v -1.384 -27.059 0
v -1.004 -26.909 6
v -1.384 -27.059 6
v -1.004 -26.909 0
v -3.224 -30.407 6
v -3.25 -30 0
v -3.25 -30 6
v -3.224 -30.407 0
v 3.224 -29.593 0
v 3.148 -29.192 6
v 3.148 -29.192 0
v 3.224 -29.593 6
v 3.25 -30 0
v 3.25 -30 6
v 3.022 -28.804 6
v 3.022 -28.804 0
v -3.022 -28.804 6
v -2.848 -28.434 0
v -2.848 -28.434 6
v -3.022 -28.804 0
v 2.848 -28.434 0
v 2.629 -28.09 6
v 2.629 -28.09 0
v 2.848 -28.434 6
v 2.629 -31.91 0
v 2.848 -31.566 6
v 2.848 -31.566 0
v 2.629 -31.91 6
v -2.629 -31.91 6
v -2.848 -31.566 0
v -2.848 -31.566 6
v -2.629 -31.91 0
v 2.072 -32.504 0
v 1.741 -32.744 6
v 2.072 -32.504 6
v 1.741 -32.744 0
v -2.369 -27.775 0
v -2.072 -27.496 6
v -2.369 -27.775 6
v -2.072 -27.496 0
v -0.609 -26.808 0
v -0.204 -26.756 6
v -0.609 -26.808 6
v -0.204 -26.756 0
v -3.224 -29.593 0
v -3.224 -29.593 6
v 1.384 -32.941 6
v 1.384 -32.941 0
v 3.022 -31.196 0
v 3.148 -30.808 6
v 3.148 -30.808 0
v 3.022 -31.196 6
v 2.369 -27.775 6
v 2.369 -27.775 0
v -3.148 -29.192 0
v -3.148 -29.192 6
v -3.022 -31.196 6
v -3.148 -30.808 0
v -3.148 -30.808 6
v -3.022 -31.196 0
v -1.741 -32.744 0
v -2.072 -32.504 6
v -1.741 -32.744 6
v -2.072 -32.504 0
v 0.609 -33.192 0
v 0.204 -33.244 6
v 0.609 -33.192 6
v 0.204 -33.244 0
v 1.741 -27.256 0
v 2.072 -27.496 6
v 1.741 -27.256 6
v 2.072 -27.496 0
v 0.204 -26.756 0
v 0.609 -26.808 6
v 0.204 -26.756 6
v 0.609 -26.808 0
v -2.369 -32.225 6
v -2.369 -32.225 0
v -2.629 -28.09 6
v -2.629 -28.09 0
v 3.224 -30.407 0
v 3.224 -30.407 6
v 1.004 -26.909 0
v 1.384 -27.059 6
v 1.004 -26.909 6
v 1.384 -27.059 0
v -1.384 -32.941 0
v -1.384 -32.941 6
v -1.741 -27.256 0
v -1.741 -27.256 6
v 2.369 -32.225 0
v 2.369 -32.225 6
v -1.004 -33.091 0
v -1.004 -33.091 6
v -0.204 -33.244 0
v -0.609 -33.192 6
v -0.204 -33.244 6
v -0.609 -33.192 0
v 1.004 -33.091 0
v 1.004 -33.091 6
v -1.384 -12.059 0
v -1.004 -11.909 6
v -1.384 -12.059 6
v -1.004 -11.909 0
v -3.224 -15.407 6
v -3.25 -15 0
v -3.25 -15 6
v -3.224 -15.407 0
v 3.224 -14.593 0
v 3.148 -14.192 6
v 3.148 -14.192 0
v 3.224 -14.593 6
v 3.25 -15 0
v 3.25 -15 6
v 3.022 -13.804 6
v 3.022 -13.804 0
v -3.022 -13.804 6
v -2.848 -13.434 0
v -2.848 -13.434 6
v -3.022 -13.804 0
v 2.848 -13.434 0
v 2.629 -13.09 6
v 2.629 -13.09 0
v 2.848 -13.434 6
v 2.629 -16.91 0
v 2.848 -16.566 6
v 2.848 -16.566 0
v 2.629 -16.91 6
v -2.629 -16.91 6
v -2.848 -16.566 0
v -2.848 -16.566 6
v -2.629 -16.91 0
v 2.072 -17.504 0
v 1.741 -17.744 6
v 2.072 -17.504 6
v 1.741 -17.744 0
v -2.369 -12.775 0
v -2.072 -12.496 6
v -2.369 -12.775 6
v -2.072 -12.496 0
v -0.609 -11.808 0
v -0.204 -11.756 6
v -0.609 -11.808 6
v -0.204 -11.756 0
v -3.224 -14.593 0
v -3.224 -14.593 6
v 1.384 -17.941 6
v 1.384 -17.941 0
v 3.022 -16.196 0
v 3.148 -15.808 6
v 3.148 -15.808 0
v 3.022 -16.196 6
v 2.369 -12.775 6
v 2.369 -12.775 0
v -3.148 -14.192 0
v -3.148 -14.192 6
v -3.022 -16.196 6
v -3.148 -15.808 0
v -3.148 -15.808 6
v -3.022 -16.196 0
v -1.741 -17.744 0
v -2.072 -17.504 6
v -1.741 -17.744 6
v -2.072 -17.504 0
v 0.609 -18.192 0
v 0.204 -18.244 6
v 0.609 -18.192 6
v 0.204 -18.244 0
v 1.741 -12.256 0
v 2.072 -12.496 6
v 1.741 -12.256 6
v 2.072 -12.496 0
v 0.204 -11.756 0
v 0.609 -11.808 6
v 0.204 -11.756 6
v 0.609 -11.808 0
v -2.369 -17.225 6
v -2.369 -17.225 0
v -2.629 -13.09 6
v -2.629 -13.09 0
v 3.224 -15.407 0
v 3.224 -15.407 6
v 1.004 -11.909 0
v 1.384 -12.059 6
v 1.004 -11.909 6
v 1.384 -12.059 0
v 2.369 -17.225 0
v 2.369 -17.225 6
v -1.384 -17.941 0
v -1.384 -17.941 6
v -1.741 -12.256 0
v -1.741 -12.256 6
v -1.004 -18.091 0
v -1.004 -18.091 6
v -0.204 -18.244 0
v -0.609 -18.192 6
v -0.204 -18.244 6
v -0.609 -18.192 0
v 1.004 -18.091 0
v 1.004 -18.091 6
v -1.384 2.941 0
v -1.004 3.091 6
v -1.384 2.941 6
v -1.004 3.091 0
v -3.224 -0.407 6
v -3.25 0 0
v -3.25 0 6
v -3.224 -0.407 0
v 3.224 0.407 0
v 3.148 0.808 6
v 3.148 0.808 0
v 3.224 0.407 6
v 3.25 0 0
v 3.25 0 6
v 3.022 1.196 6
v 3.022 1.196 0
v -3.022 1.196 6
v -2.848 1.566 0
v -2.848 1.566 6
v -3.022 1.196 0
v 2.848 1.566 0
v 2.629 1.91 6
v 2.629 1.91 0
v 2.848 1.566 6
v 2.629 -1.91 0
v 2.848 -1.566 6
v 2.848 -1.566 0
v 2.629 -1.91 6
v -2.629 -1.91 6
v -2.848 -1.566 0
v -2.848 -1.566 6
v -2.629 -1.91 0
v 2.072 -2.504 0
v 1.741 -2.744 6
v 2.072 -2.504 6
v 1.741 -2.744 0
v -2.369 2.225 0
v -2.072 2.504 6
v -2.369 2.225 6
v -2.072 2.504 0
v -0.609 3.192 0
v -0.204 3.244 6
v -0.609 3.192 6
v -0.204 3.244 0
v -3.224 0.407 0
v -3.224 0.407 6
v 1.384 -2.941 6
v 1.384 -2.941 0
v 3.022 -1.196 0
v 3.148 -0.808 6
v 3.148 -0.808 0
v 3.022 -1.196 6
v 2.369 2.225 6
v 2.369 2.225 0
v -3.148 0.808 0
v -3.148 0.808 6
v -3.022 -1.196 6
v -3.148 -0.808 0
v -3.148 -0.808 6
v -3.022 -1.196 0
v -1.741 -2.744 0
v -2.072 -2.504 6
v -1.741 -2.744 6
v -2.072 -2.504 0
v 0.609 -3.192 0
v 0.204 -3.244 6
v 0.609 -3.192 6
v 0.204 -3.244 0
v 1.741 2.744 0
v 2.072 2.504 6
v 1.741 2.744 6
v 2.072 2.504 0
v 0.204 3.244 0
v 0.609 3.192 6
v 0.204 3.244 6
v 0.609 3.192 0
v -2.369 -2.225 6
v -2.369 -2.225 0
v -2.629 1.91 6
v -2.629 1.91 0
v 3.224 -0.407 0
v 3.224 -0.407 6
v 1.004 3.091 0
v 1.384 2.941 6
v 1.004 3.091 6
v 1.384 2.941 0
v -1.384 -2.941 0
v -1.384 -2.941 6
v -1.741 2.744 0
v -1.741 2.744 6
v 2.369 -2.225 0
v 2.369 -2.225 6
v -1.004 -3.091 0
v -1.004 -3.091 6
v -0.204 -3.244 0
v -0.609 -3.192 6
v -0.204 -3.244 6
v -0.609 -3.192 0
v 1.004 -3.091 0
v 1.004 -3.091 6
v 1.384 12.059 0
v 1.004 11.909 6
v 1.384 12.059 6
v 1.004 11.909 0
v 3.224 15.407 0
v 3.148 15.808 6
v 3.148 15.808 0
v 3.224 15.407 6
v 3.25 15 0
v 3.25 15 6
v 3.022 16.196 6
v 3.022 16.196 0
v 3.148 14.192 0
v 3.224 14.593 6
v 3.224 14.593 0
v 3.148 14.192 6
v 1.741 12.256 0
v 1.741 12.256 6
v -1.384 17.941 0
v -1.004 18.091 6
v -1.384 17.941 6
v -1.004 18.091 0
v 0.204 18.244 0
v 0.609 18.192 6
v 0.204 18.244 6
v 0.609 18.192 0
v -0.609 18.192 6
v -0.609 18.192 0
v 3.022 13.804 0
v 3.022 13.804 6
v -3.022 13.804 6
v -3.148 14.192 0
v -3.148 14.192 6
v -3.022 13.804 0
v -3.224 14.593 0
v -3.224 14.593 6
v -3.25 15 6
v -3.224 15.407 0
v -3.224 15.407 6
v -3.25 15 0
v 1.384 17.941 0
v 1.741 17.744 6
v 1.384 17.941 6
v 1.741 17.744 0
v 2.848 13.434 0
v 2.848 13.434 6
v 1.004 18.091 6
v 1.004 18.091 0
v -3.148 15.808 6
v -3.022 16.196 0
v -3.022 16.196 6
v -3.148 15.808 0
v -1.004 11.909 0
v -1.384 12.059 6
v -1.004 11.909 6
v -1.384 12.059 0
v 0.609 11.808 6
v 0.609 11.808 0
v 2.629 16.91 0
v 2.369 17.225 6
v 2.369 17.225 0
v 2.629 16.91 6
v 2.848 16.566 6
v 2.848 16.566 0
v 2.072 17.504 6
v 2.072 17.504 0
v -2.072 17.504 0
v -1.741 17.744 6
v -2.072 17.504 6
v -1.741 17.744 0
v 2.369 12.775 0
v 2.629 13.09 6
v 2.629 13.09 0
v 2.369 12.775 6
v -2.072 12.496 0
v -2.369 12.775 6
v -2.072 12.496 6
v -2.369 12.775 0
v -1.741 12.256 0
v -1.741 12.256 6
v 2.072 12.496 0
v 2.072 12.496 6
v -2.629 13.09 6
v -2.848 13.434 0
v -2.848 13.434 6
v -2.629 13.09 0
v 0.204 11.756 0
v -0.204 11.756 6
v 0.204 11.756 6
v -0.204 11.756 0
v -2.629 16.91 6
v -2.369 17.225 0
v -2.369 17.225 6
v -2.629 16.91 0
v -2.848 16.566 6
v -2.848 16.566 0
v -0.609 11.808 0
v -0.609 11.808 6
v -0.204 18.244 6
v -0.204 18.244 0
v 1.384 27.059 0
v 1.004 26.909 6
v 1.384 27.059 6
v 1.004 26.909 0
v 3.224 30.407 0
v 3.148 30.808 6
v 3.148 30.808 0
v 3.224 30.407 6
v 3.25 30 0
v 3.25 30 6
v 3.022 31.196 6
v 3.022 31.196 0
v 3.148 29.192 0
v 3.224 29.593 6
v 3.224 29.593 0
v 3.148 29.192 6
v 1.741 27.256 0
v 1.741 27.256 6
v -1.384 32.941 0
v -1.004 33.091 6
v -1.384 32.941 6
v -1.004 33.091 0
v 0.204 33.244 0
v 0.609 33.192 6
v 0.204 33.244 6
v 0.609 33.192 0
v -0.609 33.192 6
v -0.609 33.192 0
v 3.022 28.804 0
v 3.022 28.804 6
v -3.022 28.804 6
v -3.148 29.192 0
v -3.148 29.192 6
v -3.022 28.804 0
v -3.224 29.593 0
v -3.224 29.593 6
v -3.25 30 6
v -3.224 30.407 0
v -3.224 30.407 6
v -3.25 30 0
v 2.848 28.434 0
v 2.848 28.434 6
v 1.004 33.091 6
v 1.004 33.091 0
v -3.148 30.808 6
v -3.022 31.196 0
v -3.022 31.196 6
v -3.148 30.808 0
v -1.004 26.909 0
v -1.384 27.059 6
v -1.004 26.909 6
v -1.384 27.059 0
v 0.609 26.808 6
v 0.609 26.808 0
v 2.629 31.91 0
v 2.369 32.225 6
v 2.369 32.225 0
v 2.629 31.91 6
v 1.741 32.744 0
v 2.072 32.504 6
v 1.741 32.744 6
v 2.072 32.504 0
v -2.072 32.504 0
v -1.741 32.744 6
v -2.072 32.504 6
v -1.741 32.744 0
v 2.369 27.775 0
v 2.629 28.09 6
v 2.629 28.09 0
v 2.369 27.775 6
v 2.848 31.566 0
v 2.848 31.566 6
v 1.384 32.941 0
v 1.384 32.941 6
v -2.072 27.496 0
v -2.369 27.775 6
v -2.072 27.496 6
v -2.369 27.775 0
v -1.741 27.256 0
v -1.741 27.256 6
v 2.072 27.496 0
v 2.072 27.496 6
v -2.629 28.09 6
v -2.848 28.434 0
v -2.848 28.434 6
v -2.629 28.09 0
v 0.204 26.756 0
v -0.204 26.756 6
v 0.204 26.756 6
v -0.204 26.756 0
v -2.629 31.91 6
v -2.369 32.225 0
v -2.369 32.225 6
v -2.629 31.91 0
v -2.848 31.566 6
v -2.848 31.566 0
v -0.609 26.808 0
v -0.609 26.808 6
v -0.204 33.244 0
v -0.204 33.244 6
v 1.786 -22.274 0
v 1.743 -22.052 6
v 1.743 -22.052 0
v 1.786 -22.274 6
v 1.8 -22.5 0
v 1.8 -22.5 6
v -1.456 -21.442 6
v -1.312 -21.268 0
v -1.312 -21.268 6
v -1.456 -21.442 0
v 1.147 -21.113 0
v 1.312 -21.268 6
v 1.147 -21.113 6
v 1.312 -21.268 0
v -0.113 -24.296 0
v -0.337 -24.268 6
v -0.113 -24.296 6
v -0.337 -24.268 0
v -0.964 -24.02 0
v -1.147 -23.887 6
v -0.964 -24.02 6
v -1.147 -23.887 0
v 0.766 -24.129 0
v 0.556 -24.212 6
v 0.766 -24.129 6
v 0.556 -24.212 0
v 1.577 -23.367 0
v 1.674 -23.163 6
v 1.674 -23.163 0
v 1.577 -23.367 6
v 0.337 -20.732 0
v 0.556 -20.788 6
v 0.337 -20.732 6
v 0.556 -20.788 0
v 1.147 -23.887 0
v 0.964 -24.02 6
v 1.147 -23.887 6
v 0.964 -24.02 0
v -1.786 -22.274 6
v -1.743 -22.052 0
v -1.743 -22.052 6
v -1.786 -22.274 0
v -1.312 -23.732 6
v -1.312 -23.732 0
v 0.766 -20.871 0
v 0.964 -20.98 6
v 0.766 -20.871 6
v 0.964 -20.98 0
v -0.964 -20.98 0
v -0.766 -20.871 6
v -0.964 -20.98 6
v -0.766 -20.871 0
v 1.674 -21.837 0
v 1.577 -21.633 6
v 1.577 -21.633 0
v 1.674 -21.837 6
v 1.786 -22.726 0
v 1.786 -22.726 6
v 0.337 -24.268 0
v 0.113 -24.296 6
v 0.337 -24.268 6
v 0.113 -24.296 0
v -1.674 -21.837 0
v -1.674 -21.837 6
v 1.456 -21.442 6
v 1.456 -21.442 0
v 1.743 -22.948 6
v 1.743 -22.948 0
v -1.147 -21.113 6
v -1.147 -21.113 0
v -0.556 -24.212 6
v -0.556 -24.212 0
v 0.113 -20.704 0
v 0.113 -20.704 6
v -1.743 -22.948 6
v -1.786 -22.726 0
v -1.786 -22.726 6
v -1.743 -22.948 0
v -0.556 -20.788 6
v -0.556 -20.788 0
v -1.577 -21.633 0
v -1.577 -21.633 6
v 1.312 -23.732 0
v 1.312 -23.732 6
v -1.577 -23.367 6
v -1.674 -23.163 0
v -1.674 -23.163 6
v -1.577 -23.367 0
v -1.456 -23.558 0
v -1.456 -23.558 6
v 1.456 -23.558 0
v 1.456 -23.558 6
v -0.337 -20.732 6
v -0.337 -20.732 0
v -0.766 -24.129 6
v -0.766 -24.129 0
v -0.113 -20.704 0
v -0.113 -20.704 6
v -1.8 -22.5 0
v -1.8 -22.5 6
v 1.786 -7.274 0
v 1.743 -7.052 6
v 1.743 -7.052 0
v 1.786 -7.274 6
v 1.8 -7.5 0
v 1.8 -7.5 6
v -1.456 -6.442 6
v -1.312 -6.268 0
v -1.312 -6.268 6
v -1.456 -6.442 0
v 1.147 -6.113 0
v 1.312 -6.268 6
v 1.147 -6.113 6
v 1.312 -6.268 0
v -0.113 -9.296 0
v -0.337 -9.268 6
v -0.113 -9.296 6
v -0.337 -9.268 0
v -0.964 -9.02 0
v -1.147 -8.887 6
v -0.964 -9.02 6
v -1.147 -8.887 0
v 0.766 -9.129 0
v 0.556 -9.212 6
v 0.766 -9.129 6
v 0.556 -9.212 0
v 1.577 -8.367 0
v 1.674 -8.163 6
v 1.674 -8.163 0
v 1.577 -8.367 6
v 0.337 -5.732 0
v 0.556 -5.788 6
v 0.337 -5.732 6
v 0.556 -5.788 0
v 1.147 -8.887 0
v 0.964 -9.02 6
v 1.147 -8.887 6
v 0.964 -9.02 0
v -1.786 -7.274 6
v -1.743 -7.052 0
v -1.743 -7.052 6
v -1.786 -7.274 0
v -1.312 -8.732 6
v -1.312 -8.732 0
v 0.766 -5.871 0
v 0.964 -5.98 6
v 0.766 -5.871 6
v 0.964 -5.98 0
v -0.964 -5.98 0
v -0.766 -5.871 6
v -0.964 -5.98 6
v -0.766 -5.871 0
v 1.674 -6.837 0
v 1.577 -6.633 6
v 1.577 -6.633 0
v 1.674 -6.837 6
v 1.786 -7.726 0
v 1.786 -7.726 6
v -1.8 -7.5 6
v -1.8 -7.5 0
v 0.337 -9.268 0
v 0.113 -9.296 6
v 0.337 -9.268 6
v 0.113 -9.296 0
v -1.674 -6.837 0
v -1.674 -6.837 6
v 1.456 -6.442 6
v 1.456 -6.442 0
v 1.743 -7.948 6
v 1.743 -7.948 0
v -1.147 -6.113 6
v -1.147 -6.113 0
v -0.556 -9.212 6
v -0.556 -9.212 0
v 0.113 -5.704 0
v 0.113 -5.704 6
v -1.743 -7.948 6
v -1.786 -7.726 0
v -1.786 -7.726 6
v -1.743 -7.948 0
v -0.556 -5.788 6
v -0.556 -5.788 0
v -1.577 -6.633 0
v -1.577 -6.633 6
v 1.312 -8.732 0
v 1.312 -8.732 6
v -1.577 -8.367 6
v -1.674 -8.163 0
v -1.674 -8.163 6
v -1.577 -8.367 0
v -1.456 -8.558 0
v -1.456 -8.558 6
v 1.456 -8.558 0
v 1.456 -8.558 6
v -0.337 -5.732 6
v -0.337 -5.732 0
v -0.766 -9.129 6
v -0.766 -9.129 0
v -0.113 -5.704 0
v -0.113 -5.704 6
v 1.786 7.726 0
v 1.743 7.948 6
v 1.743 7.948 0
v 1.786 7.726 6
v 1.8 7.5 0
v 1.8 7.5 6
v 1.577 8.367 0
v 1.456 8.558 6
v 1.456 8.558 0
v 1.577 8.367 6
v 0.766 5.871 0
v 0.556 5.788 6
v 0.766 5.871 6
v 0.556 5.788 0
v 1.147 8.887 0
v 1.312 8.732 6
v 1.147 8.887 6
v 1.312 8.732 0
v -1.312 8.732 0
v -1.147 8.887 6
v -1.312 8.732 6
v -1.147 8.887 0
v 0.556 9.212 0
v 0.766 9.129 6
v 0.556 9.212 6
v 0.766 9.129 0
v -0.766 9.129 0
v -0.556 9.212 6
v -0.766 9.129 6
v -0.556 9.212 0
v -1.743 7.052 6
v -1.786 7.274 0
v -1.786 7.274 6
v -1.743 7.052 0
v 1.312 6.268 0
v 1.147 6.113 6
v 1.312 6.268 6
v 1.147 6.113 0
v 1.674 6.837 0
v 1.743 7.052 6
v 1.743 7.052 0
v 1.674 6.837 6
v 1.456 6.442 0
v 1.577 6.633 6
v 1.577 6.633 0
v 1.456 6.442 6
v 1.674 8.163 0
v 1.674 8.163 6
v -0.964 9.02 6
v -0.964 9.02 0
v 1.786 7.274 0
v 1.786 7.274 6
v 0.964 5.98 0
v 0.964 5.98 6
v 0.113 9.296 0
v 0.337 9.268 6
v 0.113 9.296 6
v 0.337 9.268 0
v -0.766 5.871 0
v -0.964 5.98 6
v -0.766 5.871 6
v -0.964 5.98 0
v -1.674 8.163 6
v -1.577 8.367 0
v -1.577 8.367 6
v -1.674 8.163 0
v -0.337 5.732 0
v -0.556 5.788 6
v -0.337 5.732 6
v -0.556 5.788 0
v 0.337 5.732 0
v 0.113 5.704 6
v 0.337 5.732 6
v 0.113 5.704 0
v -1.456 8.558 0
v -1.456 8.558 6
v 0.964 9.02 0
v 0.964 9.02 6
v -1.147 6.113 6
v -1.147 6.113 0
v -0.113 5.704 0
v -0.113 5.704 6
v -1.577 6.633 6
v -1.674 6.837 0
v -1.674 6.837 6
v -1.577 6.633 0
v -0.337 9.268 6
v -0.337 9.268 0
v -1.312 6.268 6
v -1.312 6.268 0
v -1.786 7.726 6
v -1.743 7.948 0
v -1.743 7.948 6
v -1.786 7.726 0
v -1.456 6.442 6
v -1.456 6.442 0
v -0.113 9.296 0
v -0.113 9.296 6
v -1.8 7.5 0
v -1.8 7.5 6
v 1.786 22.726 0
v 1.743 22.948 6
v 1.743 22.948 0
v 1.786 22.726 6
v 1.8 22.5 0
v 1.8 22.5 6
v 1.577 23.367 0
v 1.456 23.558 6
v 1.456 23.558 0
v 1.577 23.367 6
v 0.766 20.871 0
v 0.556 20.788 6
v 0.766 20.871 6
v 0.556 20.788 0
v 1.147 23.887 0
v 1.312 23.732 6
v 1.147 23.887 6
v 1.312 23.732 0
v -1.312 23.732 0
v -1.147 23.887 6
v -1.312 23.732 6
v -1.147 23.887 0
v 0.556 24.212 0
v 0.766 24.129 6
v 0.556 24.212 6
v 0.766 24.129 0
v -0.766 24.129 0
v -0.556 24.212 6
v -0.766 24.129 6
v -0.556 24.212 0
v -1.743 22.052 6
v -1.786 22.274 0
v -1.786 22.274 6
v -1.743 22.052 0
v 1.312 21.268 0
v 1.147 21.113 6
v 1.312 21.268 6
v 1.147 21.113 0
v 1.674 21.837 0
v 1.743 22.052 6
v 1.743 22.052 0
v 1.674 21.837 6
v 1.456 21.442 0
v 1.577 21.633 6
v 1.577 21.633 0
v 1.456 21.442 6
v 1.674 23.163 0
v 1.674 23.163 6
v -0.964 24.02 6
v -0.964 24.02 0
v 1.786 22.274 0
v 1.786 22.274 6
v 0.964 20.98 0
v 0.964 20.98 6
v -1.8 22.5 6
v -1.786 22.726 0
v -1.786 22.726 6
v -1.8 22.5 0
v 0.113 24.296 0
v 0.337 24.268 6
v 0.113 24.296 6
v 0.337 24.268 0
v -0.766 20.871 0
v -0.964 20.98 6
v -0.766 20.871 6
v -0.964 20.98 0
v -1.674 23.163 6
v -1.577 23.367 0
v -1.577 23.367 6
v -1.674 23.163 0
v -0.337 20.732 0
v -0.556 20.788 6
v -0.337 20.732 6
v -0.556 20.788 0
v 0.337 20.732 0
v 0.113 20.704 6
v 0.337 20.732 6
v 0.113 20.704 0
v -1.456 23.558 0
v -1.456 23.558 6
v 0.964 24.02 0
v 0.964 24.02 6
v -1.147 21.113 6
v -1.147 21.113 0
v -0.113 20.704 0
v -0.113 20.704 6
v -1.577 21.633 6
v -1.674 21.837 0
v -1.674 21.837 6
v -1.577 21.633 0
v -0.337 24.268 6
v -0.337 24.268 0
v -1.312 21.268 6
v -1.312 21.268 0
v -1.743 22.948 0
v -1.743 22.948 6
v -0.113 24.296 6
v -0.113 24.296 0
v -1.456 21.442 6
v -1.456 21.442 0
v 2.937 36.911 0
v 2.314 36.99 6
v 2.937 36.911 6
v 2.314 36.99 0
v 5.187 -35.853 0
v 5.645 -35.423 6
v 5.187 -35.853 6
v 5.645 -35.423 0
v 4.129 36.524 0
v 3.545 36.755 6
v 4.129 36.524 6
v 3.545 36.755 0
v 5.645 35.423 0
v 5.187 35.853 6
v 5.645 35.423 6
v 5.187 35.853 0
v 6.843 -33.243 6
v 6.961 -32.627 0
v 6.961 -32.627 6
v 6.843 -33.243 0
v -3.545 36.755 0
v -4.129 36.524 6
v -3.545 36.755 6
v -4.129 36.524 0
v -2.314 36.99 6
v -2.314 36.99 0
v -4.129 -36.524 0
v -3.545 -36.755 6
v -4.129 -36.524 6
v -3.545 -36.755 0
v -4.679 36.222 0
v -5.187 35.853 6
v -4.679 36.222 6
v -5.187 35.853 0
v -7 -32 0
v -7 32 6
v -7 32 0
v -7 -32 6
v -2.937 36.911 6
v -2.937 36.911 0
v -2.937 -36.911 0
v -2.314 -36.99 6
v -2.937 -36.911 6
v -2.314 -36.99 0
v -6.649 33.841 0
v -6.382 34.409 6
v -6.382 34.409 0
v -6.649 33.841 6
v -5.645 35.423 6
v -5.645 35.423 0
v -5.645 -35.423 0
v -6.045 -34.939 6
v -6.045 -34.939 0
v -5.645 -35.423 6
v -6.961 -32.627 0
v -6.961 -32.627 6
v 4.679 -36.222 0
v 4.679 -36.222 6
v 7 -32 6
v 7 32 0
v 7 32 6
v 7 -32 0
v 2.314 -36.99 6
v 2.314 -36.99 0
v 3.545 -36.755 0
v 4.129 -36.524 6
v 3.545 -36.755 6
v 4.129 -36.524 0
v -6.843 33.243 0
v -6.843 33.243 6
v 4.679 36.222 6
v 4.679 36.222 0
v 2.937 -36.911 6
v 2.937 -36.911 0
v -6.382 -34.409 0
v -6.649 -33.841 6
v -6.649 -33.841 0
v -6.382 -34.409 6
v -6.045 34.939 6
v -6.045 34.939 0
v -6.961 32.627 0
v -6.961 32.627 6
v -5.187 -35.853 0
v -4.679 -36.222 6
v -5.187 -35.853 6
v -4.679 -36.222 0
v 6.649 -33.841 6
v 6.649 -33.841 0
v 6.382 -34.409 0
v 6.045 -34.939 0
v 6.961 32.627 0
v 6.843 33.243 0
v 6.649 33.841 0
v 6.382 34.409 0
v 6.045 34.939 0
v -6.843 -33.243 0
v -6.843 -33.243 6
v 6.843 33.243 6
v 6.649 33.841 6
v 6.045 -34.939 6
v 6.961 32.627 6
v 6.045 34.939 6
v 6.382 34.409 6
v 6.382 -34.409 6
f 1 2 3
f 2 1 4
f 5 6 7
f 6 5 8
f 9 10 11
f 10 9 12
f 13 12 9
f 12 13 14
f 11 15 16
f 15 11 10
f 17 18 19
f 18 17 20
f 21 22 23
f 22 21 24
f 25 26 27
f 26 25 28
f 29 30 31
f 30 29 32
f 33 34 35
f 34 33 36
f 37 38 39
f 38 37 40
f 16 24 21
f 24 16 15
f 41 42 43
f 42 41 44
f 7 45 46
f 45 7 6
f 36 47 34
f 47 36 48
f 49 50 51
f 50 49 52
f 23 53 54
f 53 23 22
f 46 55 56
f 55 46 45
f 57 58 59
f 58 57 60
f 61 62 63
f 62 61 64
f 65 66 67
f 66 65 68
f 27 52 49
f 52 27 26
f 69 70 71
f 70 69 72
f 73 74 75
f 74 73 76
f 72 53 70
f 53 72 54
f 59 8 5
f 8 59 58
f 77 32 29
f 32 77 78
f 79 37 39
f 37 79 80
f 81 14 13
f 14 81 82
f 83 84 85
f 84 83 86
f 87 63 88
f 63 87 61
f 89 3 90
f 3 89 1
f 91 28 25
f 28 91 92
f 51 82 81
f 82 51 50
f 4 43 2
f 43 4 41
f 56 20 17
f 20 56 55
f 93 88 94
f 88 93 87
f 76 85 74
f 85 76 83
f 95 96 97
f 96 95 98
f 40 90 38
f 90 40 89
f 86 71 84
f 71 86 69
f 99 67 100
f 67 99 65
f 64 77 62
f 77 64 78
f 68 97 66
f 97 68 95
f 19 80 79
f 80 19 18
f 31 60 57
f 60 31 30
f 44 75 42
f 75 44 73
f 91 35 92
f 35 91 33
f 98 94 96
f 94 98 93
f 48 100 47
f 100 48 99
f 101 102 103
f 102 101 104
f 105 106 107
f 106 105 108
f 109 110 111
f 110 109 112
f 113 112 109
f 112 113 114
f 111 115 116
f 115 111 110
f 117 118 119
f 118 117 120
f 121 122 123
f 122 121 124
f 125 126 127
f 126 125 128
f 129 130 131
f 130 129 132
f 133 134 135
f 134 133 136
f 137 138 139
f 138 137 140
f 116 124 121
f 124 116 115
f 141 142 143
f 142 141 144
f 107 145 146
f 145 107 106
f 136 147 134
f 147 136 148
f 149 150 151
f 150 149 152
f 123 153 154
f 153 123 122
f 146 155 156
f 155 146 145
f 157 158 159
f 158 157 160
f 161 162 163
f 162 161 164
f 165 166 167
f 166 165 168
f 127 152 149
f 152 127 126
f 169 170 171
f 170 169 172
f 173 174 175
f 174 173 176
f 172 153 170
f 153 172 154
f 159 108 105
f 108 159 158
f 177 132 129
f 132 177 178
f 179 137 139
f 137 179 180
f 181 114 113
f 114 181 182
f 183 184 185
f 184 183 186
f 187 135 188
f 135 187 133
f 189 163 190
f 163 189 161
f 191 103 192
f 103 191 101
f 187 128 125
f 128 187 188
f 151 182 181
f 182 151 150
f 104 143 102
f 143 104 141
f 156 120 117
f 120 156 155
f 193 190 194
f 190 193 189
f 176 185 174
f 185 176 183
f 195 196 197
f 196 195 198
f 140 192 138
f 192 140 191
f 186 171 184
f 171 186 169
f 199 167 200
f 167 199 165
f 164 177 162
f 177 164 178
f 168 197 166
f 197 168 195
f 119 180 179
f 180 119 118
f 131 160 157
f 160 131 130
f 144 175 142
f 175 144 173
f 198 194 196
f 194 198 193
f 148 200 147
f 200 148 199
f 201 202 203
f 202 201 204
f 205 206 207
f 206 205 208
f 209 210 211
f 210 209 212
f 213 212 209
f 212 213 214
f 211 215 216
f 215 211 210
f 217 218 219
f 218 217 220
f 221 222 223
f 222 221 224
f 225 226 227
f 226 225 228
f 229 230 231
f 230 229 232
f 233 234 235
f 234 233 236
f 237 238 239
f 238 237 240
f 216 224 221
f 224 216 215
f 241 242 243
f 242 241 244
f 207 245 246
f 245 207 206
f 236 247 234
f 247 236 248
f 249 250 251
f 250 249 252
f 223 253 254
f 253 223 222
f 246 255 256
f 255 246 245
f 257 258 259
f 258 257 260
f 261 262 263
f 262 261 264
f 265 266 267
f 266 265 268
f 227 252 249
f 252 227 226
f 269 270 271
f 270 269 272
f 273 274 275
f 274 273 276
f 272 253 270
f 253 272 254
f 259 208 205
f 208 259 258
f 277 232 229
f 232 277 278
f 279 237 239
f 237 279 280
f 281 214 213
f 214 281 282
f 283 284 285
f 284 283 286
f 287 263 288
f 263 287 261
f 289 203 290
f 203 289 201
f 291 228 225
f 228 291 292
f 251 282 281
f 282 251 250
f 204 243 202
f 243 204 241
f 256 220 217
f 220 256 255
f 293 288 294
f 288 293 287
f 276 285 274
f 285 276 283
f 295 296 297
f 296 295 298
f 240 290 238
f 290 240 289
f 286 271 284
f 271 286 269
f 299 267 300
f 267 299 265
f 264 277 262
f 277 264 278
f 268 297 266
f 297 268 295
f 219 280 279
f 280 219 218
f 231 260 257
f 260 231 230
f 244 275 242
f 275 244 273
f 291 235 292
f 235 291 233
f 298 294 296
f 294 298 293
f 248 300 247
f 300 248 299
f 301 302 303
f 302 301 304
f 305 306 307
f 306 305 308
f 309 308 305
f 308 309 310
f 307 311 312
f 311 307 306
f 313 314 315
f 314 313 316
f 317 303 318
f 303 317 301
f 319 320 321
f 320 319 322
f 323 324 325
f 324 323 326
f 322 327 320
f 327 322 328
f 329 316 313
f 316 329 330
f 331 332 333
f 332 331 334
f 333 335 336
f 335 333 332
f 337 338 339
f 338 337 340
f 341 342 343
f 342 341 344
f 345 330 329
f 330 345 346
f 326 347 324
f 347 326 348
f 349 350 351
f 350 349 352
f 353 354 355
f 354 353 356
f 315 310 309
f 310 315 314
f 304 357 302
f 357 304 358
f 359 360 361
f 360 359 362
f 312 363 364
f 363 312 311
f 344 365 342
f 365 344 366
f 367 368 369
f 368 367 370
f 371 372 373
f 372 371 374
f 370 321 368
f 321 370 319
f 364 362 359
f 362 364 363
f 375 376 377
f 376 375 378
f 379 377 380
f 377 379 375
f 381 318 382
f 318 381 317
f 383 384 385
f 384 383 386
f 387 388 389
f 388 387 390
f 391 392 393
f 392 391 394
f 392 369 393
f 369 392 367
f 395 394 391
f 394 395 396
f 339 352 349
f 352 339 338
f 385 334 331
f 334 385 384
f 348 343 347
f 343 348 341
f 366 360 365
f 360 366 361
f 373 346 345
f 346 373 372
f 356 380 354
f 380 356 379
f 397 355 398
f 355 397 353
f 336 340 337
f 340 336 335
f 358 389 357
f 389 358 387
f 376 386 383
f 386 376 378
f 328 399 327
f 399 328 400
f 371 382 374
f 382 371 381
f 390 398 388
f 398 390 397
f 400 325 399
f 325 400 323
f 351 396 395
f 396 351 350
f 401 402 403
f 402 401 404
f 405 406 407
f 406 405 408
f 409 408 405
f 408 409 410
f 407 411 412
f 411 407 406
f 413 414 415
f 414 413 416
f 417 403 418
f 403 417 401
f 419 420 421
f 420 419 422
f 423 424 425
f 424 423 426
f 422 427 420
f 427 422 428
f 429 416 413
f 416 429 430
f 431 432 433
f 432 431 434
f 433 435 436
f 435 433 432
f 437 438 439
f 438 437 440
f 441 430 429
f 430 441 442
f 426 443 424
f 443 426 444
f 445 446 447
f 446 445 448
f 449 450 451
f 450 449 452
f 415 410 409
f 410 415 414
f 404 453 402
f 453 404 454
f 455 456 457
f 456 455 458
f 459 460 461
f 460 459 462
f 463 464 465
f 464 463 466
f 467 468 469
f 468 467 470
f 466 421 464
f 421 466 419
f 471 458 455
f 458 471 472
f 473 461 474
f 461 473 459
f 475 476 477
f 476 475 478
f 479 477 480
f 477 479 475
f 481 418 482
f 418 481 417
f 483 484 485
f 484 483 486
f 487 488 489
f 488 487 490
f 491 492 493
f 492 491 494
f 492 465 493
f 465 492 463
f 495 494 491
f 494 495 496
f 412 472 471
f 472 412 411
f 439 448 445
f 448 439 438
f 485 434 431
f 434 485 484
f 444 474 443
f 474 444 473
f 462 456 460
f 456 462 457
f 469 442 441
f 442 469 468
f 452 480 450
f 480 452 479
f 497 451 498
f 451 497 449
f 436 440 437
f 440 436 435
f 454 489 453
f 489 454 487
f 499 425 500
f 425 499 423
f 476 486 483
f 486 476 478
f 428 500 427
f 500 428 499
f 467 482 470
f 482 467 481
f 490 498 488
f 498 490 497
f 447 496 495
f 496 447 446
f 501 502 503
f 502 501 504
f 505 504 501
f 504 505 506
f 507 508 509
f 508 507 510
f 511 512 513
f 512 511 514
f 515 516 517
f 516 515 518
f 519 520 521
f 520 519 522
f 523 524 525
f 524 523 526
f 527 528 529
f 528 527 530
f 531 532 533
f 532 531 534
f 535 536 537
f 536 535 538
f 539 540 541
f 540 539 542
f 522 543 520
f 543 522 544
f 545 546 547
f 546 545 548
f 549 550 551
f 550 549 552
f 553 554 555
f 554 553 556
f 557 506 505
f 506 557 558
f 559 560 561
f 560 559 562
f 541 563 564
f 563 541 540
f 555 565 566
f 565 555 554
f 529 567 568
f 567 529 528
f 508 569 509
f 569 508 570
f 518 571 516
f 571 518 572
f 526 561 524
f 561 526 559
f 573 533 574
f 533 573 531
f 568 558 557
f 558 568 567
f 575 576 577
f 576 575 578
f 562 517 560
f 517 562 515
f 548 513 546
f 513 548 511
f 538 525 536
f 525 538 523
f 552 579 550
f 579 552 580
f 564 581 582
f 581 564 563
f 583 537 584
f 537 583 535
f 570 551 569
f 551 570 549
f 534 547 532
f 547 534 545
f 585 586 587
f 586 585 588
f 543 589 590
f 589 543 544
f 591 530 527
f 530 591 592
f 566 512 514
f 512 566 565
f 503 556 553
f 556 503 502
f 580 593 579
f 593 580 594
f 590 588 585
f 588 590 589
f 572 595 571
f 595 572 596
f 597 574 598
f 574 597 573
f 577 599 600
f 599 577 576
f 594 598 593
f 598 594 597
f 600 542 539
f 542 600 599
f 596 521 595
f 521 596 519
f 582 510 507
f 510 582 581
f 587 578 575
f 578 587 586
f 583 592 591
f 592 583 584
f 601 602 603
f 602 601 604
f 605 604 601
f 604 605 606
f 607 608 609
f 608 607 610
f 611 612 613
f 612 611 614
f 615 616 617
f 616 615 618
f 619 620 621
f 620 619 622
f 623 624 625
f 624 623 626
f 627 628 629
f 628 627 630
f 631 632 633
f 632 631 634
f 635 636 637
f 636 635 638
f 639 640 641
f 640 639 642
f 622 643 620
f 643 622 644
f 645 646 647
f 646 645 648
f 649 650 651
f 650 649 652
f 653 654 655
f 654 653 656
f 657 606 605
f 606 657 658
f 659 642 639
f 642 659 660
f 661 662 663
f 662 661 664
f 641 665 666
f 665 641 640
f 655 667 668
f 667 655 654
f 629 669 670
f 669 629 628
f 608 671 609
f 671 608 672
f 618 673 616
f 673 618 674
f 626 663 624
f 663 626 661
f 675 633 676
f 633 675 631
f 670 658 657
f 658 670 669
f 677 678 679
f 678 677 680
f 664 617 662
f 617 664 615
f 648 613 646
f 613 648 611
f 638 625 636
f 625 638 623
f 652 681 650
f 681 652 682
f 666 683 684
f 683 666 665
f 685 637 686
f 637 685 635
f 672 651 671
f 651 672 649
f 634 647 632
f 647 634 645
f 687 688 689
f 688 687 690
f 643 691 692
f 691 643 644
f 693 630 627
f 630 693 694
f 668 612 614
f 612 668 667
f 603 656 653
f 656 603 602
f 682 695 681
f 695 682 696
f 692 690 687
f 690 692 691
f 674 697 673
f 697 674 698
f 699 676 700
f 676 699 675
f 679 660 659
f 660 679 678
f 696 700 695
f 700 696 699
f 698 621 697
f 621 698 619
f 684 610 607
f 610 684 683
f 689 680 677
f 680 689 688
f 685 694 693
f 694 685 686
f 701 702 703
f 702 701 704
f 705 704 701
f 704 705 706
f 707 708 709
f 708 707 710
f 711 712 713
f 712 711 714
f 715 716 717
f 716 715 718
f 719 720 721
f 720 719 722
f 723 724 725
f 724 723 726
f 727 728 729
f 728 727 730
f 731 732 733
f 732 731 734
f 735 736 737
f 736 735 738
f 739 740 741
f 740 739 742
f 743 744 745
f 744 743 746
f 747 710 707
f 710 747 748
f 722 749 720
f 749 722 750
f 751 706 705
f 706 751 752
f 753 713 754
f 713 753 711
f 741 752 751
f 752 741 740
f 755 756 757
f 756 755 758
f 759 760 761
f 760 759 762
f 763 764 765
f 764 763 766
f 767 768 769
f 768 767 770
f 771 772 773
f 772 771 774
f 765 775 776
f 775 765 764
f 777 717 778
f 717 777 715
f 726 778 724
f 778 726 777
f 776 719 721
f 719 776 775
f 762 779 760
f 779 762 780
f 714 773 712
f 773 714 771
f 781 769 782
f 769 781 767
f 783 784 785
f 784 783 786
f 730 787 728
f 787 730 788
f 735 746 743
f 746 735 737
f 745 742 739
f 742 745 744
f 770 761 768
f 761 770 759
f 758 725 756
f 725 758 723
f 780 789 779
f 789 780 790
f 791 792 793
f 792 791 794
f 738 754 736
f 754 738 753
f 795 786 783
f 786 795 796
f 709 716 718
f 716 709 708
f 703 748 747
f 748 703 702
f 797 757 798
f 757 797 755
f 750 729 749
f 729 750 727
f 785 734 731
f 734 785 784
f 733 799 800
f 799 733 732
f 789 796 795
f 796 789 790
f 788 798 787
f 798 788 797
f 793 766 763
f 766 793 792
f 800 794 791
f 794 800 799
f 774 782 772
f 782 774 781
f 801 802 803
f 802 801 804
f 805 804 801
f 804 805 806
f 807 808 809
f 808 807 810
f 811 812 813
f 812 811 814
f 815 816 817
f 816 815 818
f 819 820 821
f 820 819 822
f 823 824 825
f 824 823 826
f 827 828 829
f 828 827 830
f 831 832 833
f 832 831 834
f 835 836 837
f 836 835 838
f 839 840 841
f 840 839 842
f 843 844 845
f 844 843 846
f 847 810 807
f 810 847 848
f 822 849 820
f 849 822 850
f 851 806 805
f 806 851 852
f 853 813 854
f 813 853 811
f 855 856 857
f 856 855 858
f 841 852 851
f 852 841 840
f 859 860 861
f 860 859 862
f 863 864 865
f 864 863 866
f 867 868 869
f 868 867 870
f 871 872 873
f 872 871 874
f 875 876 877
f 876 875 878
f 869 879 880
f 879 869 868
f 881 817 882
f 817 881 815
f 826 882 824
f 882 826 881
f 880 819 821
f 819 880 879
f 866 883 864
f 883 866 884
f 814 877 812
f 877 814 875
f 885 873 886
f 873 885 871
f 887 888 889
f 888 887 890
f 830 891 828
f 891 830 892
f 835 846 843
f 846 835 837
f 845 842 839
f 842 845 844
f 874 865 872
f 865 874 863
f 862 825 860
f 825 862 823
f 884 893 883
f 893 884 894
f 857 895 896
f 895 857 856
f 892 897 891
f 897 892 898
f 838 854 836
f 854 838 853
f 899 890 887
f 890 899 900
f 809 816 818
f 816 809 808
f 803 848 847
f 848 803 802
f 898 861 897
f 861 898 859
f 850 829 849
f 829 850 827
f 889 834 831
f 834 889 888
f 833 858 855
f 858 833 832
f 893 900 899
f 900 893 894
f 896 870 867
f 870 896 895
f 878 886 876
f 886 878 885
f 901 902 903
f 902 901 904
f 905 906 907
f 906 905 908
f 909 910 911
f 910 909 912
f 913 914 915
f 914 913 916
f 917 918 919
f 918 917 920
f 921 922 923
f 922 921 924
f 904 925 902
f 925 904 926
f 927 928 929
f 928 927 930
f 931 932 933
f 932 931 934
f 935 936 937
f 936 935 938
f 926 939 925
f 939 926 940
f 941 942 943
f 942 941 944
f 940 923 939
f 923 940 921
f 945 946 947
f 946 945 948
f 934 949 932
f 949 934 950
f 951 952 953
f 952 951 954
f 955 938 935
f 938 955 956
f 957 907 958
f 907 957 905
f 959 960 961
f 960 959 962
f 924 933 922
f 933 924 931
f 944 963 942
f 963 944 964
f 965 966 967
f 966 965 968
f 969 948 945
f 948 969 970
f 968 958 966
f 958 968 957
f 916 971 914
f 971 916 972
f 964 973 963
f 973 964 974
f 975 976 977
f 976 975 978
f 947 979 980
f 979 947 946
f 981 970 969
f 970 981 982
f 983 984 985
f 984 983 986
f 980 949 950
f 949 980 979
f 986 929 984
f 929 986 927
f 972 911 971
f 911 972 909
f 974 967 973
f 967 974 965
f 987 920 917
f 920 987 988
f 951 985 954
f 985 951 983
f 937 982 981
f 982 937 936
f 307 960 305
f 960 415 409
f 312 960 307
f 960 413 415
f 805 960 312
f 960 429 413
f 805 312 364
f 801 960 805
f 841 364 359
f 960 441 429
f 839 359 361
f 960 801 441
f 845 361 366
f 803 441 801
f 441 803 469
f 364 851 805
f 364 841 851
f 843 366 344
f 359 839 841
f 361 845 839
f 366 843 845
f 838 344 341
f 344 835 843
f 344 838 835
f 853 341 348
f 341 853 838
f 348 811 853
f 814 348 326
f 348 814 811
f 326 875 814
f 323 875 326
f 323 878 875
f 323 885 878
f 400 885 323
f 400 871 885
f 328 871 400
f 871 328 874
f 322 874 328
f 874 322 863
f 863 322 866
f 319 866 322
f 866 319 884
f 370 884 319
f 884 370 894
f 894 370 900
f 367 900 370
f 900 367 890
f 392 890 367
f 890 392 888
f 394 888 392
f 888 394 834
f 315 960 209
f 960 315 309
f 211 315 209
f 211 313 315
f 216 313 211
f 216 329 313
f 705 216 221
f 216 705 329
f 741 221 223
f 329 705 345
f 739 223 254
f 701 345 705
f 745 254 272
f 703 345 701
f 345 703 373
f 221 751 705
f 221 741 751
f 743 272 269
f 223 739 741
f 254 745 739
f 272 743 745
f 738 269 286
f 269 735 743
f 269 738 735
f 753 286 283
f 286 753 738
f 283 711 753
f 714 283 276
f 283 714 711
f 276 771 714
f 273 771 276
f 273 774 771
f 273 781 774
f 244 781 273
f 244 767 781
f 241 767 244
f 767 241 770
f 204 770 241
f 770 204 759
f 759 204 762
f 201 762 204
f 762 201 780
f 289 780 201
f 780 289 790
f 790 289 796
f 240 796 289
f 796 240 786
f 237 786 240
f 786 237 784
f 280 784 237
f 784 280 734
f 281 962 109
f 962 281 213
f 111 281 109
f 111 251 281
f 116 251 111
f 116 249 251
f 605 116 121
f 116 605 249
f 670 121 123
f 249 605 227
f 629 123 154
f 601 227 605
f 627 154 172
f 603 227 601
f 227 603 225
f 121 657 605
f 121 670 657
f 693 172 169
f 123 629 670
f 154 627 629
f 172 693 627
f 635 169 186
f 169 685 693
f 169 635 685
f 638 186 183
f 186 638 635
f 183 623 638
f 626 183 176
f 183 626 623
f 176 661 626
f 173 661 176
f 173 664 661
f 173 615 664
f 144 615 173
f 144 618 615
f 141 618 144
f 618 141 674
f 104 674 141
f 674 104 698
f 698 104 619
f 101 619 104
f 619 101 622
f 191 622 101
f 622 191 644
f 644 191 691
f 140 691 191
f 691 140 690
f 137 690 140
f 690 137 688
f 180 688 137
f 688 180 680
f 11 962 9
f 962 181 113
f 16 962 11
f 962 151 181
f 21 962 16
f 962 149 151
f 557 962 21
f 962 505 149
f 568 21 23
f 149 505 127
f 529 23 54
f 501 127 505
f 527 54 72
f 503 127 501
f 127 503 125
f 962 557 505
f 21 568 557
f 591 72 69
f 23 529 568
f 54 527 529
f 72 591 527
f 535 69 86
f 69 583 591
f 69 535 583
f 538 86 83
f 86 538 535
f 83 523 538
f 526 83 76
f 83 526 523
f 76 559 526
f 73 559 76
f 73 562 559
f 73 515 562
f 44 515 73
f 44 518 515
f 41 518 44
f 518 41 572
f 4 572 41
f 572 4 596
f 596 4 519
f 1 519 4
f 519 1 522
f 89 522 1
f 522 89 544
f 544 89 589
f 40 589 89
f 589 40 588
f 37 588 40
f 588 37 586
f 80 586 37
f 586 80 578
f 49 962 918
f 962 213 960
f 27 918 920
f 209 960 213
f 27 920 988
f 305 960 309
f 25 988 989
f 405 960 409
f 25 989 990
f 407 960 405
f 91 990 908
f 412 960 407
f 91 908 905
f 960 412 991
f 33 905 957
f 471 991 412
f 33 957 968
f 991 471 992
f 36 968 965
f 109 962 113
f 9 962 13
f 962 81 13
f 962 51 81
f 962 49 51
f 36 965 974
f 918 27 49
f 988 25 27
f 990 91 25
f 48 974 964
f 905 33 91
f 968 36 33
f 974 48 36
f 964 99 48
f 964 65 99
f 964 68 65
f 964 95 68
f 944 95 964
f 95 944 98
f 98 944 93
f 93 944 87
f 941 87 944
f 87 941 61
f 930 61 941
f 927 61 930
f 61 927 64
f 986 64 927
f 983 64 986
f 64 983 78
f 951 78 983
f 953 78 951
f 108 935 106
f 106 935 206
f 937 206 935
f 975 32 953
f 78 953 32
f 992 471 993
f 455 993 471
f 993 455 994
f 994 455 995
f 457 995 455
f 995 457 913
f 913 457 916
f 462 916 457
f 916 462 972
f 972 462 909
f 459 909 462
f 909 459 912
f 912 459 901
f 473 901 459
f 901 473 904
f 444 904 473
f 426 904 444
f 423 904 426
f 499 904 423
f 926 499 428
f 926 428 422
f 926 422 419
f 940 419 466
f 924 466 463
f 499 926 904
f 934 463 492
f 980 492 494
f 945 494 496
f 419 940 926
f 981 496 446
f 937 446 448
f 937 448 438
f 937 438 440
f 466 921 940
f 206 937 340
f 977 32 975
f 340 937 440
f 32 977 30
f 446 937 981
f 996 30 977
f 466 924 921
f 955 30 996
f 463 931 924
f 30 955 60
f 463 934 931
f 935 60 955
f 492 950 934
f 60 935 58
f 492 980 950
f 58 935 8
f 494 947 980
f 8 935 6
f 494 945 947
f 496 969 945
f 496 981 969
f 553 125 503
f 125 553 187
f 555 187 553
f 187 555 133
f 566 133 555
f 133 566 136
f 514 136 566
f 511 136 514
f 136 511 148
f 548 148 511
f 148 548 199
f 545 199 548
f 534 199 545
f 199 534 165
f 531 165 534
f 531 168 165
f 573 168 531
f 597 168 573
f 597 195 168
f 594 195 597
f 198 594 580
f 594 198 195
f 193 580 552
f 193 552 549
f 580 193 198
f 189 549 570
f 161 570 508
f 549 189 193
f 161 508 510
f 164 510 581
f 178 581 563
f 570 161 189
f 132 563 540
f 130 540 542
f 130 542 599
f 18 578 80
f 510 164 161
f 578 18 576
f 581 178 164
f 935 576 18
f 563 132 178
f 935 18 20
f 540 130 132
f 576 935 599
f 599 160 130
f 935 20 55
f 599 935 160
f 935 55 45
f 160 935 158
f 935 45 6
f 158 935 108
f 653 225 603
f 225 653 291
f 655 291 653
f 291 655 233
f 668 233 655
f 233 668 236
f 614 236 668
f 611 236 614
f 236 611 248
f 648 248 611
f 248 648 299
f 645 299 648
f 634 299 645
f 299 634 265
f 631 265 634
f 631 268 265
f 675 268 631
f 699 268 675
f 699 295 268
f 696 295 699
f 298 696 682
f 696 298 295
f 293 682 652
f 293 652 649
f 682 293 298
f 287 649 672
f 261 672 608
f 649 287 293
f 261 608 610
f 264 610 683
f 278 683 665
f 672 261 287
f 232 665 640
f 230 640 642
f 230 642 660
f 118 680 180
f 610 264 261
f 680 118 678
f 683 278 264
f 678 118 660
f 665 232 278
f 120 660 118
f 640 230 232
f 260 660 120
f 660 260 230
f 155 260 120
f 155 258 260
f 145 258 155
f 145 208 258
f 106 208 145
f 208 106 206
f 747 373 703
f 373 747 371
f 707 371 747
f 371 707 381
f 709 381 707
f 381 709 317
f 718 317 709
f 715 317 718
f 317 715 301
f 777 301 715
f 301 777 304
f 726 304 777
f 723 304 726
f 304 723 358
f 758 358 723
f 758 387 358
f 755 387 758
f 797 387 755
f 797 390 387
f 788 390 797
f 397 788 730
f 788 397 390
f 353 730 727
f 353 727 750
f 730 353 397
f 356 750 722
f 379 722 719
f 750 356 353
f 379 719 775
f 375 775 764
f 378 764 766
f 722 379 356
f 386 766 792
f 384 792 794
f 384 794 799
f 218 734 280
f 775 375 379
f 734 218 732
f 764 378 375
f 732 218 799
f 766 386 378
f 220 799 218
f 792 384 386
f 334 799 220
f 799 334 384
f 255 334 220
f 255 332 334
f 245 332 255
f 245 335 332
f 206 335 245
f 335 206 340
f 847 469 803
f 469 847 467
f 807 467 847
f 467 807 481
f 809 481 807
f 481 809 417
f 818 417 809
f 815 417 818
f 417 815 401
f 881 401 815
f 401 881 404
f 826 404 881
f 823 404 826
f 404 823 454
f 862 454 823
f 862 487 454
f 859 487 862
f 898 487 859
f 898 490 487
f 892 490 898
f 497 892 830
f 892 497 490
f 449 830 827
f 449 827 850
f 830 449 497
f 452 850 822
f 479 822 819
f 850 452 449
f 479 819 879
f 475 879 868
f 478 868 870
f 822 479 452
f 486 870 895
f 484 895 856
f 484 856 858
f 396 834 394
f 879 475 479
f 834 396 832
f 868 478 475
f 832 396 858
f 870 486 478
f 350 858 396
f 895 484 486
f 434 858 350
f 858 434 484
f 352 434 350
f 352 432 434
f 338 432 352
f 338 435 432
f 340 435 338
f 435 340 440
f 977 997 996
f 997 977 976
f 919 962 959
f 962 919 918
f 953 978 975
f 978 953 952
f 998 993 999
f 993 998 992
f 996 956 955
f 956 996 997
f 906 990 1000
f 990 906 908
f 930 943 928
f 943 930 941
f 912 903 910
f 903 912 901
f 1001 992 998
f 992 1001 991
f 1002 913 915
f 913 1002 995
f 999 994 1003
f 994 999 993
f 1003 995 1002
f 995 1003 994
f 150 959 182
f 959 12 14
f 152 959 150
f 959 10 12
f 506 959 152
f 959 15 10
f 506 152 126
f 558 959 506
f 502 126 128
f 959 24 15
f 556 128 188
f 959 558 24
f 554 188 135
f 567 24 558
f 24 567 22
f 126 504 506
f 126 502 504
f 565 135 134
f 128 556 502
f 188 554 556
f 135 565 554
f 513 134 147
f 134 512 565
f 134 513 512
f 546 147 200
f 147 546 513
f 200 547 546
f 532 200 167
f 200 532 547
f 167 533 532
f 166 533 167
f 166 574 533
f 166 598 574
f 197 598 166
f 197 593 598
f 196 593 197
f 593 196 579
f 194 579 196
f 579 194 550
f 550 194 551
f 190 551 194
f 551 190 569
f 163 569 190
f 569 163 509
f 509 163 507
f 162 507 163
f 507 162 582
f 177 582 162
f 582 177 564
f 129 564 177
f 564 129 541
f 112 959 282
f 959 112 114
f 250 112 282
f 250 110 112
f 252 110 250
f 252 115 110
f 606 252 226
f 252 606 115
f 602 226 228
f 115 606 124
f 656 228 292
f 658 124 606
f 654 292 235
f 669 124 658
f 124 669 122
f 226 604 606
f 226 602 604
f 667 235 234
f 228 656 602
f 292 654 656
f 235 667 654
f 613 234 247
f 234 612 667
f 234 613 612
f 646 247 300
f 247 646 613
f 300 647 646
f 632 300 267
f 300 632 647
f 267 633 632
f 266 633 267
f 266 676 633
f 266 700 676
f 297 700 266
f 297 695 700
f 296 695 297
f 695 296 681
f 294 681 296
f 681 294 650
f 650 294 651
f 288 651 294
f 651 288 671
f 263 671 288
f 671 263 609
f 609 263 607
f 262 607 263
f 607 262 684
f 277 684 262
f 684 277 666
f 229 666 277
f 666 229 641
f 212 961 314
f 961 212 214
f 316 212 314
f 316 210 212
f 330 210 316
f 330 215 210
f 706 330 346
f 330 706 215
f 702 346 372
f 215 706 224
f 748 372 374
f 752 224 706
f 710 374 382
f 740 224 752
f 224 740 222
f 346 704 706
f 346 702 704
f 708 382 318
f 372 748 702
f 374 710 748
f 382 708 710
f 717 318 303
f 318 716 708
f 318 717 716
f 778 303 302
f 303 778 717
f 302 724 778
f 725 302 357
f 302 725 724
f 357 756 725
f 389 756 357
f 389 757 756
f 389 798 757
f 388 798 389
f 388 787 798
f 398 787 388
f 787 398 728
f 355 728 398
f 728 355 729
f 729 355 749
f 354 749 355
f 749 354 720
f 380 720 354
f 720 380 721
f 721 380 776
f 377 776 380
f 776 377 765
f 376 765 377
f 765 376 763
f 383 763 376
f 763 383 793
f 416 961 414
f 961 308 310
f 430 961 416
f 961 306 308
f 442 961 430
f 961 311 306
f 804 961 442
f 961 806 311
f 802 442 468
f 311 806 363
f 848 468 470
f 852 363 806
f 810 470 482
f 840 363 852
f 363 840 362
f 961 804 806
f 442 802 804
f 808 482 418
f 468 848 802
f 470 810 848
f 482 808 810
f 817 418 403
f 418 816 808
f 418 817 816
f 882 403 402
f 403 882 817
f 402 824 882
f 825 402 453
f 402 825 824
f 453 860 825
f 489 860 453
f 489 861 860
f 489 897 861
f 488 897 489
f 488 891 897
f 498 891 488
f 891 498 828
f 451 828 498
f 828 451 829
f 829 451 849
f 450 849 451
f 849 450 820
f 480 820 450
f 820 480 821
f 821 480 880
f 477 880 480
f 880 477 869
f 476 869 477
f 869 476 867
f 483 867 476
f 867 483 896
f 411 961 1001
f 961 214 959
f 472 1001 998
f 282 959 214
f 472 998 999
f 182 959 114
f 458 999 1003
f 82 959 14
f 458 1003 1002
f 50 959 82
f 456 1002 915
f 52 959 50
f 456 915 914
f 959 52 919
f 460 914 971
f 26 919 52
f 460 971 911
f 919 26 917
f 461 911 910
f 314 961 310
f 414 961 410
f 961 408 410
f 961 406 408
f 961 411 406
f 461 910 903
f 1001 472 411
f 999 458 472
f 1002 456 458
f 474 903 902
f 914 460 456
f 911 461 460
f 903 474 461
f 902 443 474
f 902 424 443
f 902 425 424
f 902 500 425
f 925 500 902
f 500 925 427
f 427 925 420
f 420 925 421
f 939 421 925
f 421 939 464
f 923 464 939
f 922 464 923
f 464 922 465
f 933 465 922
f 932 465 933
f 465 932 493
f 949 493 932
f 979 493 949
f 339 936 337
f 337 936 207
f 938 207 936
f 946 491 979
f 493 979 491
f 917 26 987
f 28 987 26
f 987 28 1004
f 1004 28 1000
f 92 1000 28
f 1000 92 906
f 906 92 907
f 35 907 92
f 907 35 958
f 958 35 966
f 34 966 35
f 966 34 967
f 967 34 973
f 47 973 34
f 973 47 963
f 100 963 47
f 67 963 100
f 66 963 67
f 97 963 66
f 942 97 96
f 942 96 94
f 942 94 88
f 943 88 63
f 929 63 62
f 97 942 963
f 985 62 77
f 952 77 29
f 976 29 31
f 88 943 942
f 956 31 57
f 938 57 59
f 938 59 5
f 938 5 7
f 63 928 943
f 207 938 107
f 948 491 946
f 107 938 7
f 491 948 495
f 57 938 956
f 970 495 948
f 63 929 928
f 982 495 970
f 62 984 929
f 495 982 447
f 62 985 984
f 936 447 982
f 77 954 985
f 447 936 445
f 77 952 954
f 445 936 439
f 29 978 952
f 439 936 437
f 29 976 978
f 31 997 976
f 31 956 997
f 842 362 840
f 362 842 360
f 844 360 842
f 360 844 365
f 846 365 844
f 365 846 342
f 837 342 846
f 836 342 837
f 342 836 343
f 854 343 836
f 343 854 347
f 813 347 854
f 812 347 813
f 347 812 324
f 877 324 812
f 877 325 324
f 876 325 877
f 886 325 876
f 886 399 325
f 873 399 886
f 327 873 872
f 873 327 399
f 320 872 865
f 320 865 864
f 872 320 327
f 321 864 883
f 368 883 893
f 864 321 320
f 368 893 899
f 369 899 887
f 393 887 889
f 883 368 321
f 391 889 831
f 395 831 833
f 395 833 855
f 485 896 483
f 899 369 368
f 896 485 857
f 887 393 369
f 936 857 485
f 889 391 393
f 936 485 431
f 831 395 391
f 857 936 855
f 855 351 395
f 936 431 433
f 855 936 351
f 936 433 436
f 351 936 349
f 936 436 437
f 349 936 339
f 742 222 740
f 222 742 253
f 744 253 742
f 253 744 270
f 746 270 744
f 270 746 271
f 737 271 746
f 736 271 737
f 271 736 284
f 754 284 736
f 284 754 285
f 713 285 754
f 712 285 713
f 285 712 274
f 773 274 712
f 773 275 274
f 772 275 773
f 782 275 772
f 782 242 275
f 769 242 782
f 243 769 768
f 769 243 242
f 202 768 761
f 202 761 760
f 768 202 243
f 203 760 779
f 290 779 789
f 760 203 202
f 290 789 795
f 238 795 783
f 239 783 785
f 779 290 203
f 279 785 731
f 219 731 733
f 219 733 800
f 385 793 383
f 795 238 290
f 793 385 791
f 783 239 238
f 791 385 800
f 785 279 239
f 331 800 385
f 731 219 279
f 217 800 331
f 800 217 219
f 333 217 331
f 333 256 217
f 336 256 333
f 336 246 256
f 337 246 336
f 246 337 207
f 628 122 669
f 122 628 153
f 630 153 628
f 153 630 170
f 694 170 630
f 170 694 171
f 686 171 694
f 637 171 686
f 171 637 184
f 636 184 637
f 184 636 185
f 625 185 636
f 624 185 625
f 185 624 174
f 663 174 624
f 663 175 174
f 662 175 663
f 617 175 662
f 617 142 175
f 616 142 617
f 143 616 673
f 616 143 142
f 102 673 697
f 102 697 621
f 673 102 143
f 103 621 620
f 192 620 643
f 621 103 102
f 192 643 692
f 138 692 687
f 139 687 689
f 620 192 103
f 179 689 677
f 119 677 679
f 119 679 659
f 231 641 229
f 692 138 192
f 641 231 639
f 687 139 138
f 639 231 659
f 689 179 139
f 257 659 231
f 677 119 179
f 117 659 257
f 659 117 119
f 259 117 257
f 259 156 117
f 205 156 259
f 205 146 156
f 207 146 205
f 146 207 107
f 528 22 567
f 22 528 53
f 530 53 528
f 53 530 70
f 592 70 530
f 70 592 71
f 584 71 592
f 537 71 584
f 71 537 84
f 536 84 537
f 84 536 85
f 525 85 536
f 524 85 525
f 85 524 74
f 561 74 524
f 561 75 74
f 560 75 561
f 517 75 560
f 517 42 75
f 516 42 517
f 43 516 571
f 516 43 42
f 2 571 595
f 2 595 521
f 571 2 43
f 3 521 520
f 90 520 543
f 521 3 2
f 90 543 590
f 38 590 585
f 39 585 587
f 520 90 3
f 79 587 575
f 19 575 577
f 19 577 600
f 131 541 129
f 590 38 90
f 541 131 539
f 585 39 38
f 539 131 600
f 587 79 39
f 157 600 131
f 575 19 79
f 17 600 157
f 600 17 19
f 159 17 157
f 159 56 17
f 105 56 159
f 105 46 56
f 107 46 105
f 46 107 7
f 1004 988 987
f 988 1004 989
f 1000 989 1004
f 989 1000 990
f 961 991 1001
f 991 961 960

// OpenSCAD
$fn = 50;

difference() {
	union() {
		hull() {
			translate(v = [-2.0, 32.0, 0]) {
				cylinder(h = 6, r = 5);
			}
			translate(v = [2.0, 32.0, 0]) {
				cylinder(h = 6, r = 5);
			}
			translate(v = [-2.0, -32.0, 0]) {
				cylinder(h = 6, r = 5);
			}
			translate(v = [2.0, -32.0, 0]) {
				cylinder(h = 6, r = 5);
			}
		}
	}
	union() {
		translate(v = [0.0, -30.0, 0]) {
			translate(v = [0, 0, -100]) {
				cylinder(h = 200, r = 3.25);
			}
		}
		translate(v = [0.0, -15.0, 0]) {
			translate(v = [0, 0, -100]) {
				cylinder(h = 200, r = 3.25);
			}
		}
		translate(v = [0, 0, -100]) {
			cylinder(h = 200, r = 3.25);
		}
		translate(v = [0.0, 15.0, 0]) {
			translate(v = [0, 0, -100]) {
				cylinder(h = 200, r = 3.25);
			}
		}
		translate(v = [0.0, 30.0, 0]) {
			translate(v = [0, 0, -100]) {
				cylinder(h = 200, r = 3.25);
			}
		}
		translate(v = [0.0, -30.0, 0]) {
			translate(v = [0, 0, -100]) {
				cylinder(h = 200, r = 1.8);
			}
		}
		translate(v = [0.0, -22.5, 0]) {
			translate(v = [0, 0, -100]) {
				cylinder(h = 200, r = 1.8);
			}
		}
		translate(v = [0.0, -15.0, 0]) {
			translate(v = [0, 0, -100]) {
				cylinder(h = 200, r = 1.8);
			}
		}
		translate(v = [0.0, -7.5, 0]) {
			translate(v = [0, 0, -100]) {
				cylinder(h = 200, r = 1.8);
			}
		}
		translate(v = [0, 0, -100]) {
			cylinder(h = 200, r = 1.8);
		}
		translate(v = [0.0, 7.5, 0]) {
			translate(v = [0, 0, -100]) {
				cylinder(h = 200, r = 1.8);
			}
		}
		translate(v = [0.0, 15.0, 0]) {
			translate(v = [0, 0, -100]) {
				cylinder(h = 200, r = 1.8);
			}
		}
		translate(v = [0.0, 22.5, 0]) {
			translate(v = [0, 0, -100]) {
				cylinder(h = 200, r = 1.8);
			}
		}
		translate(v = [0.0, 30.0, 0]) {
			translate(v = [0, 0, -100]) {
				cylinder(h = 200, r = 1.8);
			}
		}
	}
}
